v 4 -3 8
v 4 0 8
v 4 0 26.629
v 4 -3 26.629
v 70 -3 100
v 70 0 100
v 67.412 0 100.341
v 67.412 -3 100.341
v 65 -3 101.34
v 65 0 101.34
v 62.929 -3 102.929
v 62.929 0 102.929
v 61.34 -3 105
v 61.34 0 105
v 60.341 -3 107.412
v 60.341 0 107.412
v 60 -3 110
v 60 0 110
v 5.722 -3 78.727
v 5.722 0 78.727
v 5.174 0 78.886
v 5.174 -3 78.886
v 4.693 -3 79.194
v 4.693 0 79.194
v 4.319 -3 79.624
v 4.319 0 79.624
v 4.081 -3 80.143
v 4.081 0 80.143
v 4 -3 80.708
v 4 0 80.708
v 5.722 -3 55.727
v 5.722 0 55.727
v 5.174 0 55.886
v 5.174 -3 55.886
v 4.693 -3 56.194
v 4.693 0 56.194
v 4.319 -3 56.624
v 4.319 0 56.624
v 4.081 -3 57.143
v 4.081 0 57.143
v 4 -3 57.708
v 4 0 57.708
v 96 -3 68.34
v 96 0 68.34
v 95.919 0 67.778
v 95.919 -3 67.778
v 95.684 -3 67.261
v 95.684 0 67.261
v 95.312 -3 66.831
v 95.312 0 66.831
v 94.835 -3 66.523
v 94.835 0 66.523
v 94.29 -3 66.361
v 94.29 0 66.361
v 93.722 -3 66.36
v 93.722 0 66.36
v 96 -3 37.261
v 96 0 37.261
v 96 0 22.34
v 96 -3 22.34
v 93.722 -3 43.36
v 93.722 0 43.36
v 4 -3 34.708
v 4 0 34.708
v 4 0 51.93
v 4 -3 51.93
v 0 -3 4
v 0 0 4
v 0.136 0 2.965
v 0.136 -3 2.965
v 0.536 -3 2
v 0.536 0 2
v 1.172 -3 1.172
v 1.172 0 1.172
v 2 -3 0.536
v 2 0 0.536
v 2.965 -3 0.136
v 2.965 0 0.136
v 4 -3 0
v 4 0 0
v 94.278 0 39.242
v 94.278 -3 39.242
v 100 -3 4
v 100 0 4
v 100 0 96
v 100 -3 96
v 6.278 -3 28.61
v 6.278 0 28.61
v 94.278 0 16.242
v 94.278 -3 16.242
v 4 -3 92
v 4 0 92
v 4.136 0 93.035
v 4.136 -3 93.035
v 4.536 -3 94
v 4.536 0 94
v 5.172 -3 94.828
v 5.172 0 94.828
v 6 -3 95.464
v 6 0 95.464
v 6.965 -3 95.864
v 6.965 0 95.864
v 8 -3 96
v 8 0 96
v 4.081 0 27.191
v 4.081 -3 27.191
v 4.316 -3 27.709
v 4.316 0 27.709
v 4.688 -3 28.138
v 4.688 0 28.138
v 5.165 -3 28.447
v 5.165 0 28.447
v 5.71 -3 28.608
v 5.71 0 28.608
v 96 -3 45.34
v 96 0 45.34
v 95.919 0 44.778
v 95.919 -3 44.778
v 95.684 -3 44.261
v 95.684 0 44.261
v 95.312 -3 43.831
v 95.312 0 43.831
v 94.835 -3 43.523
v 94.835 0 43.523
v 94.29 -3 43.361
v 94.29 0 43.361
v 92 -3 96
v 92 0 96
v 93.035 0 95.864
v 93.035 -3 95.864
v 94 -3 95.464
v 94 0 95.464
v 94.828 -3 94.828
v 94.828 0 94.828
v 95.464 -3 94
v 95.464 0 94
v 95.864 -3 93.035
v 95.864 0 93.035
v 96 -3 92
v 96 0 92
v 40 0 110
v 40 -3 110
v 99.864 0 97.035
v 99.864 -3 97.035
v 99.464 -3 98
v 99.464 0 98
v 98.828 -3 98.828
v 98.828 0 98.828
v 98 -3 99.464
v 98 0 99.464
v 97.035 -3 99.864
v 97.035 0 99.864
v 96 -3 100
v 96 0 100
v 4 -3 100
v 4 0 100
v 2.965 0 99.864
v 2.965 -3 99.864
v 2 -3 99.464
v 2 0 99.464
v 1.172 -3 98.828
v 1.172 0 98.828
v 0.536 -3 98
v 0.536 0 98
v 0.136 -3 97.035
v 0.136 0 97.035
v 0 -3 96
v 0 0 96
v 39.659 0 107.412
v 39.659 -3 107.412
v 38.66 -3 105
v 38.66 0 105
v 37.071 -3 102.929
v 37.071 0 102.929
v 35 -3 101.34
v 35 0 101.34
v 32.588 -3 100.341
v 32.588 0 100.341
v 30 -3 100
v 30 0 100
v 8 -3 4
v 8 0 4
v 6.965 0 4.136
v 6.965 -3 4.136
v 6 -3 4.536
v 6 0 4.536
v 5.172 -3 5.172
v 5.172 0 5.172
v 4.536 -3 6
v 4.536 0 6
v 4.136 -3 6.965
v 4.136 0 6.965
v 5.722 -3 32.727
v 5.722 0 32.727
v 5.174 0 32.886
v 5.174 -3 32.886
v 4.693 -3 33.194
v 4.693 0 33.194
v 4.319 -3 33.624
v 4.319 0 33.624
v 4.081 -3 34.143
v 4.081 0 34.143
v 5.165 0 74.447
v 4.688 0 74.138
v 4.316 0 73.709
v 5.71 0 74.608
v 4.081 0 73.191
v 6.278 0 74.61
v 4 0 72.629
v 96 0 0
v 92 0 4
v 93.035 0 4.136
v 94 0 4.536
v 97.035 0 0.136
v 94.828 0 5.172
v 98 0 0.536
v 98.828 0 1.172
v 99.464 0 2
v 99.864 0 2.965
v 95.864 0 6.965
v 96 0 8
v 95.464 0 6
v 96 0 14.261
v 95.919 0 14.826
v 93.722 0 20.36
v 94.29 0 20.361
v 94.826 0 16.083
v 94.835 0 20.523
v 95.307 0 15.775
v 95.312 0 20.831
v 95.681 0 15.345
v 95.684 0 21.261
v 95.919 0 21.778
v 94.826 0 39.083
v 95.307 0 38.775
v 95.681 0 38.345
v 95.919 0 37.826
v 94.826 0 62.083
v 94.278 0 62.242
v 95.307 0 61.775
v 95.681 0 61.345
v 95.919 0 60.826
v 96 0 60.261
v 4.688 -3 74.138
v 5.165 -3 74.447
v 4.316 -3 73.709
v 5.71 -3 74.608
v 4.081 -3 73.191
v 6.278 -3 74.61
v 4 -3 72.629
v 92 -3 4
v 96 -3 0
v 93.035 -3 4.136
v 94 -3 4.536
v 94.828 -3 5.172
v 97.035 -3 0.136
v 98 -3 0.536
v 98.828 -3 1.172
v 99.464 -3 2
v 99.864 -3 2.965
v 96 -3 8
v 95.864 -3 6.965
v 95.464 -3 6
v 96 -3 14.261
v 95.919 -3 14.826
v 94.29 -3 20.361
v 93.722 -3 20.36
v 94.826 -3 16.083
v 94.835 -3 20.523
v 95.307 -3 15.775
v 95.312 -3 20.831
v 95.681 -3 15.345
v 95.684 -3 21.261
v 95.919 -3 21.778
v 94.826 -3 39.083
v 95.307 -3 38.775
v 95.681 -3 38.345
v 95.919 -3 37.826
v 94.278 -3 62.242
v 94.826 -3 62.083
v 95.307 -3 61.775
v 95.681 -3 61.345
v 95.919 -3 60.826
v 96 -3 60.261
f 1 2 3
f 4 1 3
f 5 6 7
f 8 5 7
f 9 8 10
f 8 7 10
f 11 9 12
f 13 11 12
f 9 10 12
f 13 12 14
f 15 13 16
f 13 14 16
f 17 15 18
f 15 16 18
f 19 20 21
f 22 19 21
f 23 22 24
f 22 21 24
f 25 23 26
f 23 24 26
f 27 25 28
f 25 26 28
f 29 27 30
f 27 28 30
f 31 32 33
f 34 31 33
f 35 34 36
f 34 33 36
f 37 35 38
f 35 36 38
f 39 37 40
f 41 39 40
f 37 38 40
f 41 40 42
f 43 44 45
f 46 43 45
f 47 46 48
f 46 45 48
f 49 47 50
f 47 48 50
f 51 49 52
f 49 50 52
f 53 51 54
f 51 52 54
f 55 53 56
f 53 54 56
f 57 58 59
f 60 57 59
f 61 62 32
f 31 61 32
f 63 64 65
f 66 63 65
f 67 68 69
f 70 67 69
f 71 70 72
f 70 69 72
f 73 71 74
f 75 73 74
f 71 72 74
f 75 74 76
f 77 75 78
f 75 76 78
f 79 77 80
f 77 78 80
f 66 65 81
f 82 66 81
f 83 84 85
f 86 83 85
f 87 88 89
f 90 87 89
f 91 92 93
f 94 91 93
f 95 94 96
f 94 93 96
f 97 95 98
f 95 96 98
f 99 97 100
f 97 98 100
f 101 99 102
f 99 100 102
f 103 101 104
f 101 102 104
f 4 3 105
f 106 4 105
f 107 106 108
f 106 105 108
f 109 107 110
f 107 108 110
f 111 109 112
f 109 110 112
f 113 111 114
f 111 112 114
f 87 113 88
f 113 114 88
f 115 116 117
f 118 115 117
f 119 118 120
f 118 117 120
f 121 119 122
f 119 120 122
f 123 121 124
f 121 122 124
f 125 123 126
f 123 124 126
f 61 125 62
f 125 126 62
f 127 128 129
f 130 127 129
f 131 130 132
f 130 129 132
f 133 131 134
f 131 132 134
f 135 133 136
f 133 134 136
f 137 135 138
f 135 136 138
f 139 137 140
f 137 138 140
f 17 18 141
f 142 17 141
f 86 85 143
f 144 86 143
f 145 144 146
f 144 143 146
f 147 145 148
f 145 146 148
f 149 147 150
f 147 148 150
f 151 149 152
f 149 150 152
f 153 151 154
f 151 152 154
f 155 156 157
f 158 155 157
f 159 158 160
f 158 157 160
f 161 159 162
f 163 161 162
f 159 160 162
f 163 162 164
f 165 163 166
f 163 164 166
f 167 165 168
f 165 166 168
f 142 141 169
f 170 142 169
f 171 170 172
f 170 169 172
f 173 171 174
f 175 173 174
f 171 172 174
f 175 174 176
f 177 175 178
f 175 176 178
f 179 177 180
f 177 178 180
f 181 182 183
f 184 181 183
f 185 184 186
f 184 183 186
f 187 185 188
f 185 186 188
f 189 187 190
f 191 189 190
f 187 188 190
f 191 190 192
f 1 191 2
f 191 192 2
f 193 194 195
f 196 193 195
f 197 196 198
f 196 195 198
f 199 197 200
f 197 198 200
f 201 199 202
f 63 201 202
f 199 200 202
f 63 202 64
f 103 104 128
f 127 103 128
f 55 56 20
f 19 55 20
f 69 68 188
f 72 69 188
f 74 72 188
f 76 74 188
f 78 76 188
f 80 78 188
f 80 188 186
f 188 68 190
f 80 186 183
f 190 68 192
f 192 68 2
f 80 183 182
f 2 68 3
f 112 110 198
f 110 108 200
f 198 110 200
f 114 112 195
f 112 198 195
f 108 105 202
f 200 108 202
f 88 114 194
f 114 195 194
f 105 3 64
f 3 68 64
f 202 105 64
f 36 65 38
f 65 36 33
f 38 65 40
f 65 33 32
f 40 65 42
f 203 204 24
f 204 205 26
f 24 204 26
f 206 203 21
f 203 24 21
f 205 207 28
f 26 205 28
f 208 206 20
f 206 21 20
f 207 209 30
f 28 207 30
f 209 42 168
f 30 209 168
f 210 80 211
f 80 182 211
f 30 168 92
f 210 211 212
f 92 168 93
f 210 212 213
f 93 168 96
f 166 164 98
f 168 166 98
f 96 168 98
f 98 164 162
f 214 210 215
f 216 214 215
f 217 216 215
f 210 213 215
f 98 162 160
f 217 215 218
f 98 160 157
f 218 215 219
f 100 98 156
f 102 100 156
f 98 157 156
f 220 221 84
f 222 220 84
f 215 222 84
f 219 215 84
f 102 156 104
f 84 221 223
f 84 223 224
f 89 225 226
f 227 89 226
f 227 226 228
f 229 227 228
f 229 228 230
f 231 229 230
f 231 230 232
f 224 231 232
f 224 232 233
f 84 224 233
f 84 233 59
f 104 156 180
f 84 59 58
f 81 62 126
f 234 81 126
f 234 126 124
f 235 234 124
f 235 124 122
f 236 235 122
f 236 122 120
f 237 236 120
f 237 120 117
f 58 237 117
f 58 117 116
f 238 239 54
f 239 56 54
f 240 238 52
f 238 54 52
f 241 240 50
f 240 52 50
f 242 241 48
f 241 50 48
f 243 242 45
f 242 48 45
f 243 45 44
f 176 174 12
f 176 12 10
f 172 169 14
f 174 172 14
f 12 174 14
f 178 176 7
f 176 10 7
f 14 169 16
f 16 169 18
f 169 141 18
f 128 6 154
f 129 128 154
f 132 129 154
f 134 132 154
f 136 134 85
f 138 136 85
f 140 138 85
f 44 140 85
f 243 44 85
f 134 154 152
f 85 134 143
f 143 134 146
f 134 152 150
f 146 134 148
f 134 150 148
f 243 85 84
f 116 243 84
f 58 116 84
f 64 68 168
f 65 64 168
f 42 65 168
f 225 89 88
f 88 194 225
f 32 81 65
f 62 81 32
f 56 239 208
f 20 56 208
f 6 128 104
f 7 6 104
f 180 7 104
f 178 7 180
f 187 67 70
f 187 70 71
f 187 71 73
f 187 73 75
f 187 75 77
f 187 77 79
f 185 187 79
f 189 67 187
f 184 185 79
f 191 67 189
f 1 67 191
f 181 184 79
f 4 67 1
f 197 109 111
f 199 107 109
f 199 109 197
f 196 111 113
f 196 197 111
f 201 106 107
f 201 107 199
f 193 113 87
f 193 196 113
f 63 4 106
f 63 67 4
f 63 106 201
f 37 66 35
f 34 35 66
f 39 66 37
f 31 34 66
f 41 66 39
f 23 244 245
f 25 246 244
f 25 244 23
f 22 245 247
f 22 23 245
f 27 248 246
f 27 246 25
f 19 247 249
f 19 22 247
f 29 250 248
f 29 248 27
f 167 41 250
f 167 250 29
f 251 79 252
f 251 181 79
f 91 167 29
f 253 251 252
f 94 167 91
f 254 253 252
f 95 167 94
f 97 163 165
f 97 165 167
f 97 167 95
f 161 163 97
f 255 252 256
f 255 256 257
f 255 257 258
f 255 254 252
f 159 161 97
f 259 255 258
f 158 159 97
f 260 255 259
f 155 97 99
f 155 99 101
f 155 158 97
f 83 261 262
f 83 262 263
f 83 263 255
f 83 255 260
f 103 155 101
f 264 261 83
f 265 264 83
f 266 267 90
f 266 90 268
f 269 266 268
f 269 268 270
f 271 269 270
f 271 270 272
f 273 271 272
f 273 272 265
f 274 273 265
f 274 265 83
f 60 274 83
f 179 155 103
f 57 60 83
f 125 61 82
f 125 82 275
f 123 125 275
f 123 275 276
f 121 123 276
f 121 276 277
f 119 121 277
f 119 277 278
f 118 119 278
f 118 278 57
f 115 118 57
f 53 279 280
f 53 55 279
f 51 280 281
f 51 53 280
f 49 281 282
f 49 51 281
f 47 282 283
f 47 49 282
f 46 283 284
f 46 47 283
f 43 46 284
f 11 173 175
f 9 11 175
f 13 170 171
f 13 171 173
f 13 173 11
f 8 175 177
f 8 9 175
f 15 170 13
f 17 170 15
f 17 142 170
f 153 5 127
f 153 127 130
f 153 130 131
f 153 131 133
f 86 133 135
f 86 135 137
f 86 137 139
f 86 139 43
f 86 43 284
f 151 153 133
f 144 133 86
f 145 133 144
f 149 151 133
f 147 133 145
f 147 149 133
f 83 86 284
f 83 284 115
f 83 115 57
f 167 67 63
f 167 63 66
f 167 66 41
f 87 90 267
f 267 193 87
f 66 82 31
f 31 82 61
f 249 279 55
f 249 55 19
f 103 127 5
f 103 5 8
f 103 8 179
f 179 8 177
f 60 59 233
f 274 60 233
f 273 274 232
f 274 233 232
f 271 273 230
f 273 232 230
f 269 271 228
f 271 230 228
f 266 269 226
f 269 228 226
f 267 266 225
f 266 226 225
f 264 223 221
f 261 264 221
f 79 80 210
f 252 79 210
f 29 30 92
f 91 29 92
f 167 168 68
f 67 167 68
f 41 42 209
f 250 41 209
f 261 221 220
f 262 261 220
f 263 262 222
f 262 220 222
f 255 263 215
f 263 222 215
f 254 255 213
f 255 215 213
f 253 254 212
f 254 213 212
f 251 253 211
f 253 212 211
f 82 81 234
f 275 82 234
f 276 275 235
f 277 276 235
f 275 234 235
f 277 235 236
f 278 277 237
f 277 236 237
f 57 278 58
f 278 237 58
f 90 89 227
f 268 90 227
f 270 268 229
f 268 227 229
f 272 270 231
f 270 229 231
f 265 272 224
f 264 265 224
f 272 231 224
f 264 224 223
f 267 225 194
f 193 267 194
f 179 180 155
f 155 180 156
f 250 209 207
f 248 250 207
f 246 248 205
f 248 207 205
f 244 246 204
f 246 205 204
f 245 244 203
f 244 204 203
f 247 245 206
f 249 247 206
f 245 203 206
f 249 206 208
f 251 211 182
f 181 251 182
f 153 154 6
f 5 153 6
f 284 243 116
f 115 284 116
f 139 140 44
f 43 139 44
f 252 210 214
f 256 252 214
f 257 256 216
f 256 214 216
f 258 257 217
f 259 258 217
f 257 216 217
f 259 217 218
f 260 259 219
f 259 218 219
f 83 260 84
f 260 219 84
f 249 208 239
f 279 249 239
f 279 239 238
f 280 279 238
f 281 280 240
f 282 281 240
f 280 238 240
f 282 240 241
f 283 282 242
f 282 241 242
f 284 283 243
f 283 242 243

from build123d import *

# Parameters (mm, degrees)
F1_DEPTH = 3


with BuildPart() as f1:
    # F0 (on Front) → F1 (new body)
    with BuildSketch(Plane.XZ):
        with BuildLine():
            ThreePointArc((0, 4), (1.171573, 1.171573), (4, 0))
            Line((4, 0), (96, 0))
            ThreePointArc((96, 0), (98.828427, 1.171573), (100, 4))
            Line((100, 4), (100, 96))
            ThreePointArc((100, 96), (98.828427, 98.828427), (96, 100))
            Line((96, 100), (70, 100))
            ThreePointArc((70, 100), (62.928932, 102.928932), (60, 110))
            Line((60, 110), (40, 110))
            ThreePointArc((40, 110), (37.071068, 102.928932), (30, 100))
            Line((30, 100), (4, 100))
            ThreePointArc((4, 100), (1.171573, 98.828427), (0, 96))
            Line((0, 96), (0, 4))
        make_face()
        with BuildLine():
            Line((92, 4), (8, 4))
            ThreePointArc((8, 4), (5.171573, 5.171573), (4, 8))
            Line((4, 8), (4, 26.62902))
            ThreePointArc((4, 26.62902), (4.687882, 28.138439), (6.278346, 28.609556))
            Line((6.278346, 28.609556), (94.278346, 16.241963))
            ThreePointArc((94.278346, 16.241963), (95.509419, 15.573545), (96, 14.261427))
            Line((96, 14.261427), (96, 8))
            ThreePointArc((96, 8), (94.828427, 5.171573), (92, 4))
        make_face(mode=Mode.SUBTRACT)
        with BuildLine():
            Line((93.721654, 20.359511), (5.721654, 32.727104))
            ThreePointArc((5.721654, 32.727104), (4.490581, 33.395523), (4, 34.707641))
            Line((4, 34.707641), (4, 51.929757))
            Line((4, 51.929757), (94.278346, 39.241963))
            ThreePointArc((94.278346, 39.241963), (95.509419, 38.573545), (96, 37.261427))
            Line((96, 37.261427), (96, 22.340047))
            ThreePointArc((96, 22.340047), (95.312118, 20.830628), (93.721654, 20.359511))
        make_face(mode=Mode.SUBTRACT)
        with BuildLine():
            Line((93.721654, 43.359511), (5.721654, 55.727104))
            ThreePointArc((5.721654, 55.727104), (4.490581, 56.395523), (4, 57.707641))
            Line((4, 57.707641), (4, 72.62902))
            ThreePointArc((4, 72.62902), (4.687882, 74.138439), (6.278346, 74.609556))
            Line((6.278346, 74.609556), (94.278346, 62.241963))
            ThreePointArc((94.278346, 62.241963), (95.509419, 61.573545), (96, 60.261427))
            Line((96, 60.261427), (96, 45.340047))
            ThreePointArc((96, 45.340047), (95.312118, 43.830628), (93.721654, 43.359511))
        make_face(mode=Mode.SUBTRACT)
        with BuildLine():
            ThreePointArc((4, 92), (5.171573, 94.828427), (8, 96))
            Line((8, 96), (92, 96))
            ThreePointArc((92, 96), (94.828427, 94.828427), (96, 92))
            Line((96, 92), (96, 68.340047))
            ThreePointArc((96, 68.340047), (95.312118, 66.830628), (93.721654, 66.359511))
            Line((93.721654, 66.359511), (5.721654, 78.727104))
            ThreePointArc((5.721654, 78.727104), (4.490581, 79.395523), (4, 80.707641))
            Line((4, 80.707641), (4, 92))
        make_face(mode=Mode.SUBTRACT)
    extrude(amount=F1_DEPTH)


solid = f1.part
